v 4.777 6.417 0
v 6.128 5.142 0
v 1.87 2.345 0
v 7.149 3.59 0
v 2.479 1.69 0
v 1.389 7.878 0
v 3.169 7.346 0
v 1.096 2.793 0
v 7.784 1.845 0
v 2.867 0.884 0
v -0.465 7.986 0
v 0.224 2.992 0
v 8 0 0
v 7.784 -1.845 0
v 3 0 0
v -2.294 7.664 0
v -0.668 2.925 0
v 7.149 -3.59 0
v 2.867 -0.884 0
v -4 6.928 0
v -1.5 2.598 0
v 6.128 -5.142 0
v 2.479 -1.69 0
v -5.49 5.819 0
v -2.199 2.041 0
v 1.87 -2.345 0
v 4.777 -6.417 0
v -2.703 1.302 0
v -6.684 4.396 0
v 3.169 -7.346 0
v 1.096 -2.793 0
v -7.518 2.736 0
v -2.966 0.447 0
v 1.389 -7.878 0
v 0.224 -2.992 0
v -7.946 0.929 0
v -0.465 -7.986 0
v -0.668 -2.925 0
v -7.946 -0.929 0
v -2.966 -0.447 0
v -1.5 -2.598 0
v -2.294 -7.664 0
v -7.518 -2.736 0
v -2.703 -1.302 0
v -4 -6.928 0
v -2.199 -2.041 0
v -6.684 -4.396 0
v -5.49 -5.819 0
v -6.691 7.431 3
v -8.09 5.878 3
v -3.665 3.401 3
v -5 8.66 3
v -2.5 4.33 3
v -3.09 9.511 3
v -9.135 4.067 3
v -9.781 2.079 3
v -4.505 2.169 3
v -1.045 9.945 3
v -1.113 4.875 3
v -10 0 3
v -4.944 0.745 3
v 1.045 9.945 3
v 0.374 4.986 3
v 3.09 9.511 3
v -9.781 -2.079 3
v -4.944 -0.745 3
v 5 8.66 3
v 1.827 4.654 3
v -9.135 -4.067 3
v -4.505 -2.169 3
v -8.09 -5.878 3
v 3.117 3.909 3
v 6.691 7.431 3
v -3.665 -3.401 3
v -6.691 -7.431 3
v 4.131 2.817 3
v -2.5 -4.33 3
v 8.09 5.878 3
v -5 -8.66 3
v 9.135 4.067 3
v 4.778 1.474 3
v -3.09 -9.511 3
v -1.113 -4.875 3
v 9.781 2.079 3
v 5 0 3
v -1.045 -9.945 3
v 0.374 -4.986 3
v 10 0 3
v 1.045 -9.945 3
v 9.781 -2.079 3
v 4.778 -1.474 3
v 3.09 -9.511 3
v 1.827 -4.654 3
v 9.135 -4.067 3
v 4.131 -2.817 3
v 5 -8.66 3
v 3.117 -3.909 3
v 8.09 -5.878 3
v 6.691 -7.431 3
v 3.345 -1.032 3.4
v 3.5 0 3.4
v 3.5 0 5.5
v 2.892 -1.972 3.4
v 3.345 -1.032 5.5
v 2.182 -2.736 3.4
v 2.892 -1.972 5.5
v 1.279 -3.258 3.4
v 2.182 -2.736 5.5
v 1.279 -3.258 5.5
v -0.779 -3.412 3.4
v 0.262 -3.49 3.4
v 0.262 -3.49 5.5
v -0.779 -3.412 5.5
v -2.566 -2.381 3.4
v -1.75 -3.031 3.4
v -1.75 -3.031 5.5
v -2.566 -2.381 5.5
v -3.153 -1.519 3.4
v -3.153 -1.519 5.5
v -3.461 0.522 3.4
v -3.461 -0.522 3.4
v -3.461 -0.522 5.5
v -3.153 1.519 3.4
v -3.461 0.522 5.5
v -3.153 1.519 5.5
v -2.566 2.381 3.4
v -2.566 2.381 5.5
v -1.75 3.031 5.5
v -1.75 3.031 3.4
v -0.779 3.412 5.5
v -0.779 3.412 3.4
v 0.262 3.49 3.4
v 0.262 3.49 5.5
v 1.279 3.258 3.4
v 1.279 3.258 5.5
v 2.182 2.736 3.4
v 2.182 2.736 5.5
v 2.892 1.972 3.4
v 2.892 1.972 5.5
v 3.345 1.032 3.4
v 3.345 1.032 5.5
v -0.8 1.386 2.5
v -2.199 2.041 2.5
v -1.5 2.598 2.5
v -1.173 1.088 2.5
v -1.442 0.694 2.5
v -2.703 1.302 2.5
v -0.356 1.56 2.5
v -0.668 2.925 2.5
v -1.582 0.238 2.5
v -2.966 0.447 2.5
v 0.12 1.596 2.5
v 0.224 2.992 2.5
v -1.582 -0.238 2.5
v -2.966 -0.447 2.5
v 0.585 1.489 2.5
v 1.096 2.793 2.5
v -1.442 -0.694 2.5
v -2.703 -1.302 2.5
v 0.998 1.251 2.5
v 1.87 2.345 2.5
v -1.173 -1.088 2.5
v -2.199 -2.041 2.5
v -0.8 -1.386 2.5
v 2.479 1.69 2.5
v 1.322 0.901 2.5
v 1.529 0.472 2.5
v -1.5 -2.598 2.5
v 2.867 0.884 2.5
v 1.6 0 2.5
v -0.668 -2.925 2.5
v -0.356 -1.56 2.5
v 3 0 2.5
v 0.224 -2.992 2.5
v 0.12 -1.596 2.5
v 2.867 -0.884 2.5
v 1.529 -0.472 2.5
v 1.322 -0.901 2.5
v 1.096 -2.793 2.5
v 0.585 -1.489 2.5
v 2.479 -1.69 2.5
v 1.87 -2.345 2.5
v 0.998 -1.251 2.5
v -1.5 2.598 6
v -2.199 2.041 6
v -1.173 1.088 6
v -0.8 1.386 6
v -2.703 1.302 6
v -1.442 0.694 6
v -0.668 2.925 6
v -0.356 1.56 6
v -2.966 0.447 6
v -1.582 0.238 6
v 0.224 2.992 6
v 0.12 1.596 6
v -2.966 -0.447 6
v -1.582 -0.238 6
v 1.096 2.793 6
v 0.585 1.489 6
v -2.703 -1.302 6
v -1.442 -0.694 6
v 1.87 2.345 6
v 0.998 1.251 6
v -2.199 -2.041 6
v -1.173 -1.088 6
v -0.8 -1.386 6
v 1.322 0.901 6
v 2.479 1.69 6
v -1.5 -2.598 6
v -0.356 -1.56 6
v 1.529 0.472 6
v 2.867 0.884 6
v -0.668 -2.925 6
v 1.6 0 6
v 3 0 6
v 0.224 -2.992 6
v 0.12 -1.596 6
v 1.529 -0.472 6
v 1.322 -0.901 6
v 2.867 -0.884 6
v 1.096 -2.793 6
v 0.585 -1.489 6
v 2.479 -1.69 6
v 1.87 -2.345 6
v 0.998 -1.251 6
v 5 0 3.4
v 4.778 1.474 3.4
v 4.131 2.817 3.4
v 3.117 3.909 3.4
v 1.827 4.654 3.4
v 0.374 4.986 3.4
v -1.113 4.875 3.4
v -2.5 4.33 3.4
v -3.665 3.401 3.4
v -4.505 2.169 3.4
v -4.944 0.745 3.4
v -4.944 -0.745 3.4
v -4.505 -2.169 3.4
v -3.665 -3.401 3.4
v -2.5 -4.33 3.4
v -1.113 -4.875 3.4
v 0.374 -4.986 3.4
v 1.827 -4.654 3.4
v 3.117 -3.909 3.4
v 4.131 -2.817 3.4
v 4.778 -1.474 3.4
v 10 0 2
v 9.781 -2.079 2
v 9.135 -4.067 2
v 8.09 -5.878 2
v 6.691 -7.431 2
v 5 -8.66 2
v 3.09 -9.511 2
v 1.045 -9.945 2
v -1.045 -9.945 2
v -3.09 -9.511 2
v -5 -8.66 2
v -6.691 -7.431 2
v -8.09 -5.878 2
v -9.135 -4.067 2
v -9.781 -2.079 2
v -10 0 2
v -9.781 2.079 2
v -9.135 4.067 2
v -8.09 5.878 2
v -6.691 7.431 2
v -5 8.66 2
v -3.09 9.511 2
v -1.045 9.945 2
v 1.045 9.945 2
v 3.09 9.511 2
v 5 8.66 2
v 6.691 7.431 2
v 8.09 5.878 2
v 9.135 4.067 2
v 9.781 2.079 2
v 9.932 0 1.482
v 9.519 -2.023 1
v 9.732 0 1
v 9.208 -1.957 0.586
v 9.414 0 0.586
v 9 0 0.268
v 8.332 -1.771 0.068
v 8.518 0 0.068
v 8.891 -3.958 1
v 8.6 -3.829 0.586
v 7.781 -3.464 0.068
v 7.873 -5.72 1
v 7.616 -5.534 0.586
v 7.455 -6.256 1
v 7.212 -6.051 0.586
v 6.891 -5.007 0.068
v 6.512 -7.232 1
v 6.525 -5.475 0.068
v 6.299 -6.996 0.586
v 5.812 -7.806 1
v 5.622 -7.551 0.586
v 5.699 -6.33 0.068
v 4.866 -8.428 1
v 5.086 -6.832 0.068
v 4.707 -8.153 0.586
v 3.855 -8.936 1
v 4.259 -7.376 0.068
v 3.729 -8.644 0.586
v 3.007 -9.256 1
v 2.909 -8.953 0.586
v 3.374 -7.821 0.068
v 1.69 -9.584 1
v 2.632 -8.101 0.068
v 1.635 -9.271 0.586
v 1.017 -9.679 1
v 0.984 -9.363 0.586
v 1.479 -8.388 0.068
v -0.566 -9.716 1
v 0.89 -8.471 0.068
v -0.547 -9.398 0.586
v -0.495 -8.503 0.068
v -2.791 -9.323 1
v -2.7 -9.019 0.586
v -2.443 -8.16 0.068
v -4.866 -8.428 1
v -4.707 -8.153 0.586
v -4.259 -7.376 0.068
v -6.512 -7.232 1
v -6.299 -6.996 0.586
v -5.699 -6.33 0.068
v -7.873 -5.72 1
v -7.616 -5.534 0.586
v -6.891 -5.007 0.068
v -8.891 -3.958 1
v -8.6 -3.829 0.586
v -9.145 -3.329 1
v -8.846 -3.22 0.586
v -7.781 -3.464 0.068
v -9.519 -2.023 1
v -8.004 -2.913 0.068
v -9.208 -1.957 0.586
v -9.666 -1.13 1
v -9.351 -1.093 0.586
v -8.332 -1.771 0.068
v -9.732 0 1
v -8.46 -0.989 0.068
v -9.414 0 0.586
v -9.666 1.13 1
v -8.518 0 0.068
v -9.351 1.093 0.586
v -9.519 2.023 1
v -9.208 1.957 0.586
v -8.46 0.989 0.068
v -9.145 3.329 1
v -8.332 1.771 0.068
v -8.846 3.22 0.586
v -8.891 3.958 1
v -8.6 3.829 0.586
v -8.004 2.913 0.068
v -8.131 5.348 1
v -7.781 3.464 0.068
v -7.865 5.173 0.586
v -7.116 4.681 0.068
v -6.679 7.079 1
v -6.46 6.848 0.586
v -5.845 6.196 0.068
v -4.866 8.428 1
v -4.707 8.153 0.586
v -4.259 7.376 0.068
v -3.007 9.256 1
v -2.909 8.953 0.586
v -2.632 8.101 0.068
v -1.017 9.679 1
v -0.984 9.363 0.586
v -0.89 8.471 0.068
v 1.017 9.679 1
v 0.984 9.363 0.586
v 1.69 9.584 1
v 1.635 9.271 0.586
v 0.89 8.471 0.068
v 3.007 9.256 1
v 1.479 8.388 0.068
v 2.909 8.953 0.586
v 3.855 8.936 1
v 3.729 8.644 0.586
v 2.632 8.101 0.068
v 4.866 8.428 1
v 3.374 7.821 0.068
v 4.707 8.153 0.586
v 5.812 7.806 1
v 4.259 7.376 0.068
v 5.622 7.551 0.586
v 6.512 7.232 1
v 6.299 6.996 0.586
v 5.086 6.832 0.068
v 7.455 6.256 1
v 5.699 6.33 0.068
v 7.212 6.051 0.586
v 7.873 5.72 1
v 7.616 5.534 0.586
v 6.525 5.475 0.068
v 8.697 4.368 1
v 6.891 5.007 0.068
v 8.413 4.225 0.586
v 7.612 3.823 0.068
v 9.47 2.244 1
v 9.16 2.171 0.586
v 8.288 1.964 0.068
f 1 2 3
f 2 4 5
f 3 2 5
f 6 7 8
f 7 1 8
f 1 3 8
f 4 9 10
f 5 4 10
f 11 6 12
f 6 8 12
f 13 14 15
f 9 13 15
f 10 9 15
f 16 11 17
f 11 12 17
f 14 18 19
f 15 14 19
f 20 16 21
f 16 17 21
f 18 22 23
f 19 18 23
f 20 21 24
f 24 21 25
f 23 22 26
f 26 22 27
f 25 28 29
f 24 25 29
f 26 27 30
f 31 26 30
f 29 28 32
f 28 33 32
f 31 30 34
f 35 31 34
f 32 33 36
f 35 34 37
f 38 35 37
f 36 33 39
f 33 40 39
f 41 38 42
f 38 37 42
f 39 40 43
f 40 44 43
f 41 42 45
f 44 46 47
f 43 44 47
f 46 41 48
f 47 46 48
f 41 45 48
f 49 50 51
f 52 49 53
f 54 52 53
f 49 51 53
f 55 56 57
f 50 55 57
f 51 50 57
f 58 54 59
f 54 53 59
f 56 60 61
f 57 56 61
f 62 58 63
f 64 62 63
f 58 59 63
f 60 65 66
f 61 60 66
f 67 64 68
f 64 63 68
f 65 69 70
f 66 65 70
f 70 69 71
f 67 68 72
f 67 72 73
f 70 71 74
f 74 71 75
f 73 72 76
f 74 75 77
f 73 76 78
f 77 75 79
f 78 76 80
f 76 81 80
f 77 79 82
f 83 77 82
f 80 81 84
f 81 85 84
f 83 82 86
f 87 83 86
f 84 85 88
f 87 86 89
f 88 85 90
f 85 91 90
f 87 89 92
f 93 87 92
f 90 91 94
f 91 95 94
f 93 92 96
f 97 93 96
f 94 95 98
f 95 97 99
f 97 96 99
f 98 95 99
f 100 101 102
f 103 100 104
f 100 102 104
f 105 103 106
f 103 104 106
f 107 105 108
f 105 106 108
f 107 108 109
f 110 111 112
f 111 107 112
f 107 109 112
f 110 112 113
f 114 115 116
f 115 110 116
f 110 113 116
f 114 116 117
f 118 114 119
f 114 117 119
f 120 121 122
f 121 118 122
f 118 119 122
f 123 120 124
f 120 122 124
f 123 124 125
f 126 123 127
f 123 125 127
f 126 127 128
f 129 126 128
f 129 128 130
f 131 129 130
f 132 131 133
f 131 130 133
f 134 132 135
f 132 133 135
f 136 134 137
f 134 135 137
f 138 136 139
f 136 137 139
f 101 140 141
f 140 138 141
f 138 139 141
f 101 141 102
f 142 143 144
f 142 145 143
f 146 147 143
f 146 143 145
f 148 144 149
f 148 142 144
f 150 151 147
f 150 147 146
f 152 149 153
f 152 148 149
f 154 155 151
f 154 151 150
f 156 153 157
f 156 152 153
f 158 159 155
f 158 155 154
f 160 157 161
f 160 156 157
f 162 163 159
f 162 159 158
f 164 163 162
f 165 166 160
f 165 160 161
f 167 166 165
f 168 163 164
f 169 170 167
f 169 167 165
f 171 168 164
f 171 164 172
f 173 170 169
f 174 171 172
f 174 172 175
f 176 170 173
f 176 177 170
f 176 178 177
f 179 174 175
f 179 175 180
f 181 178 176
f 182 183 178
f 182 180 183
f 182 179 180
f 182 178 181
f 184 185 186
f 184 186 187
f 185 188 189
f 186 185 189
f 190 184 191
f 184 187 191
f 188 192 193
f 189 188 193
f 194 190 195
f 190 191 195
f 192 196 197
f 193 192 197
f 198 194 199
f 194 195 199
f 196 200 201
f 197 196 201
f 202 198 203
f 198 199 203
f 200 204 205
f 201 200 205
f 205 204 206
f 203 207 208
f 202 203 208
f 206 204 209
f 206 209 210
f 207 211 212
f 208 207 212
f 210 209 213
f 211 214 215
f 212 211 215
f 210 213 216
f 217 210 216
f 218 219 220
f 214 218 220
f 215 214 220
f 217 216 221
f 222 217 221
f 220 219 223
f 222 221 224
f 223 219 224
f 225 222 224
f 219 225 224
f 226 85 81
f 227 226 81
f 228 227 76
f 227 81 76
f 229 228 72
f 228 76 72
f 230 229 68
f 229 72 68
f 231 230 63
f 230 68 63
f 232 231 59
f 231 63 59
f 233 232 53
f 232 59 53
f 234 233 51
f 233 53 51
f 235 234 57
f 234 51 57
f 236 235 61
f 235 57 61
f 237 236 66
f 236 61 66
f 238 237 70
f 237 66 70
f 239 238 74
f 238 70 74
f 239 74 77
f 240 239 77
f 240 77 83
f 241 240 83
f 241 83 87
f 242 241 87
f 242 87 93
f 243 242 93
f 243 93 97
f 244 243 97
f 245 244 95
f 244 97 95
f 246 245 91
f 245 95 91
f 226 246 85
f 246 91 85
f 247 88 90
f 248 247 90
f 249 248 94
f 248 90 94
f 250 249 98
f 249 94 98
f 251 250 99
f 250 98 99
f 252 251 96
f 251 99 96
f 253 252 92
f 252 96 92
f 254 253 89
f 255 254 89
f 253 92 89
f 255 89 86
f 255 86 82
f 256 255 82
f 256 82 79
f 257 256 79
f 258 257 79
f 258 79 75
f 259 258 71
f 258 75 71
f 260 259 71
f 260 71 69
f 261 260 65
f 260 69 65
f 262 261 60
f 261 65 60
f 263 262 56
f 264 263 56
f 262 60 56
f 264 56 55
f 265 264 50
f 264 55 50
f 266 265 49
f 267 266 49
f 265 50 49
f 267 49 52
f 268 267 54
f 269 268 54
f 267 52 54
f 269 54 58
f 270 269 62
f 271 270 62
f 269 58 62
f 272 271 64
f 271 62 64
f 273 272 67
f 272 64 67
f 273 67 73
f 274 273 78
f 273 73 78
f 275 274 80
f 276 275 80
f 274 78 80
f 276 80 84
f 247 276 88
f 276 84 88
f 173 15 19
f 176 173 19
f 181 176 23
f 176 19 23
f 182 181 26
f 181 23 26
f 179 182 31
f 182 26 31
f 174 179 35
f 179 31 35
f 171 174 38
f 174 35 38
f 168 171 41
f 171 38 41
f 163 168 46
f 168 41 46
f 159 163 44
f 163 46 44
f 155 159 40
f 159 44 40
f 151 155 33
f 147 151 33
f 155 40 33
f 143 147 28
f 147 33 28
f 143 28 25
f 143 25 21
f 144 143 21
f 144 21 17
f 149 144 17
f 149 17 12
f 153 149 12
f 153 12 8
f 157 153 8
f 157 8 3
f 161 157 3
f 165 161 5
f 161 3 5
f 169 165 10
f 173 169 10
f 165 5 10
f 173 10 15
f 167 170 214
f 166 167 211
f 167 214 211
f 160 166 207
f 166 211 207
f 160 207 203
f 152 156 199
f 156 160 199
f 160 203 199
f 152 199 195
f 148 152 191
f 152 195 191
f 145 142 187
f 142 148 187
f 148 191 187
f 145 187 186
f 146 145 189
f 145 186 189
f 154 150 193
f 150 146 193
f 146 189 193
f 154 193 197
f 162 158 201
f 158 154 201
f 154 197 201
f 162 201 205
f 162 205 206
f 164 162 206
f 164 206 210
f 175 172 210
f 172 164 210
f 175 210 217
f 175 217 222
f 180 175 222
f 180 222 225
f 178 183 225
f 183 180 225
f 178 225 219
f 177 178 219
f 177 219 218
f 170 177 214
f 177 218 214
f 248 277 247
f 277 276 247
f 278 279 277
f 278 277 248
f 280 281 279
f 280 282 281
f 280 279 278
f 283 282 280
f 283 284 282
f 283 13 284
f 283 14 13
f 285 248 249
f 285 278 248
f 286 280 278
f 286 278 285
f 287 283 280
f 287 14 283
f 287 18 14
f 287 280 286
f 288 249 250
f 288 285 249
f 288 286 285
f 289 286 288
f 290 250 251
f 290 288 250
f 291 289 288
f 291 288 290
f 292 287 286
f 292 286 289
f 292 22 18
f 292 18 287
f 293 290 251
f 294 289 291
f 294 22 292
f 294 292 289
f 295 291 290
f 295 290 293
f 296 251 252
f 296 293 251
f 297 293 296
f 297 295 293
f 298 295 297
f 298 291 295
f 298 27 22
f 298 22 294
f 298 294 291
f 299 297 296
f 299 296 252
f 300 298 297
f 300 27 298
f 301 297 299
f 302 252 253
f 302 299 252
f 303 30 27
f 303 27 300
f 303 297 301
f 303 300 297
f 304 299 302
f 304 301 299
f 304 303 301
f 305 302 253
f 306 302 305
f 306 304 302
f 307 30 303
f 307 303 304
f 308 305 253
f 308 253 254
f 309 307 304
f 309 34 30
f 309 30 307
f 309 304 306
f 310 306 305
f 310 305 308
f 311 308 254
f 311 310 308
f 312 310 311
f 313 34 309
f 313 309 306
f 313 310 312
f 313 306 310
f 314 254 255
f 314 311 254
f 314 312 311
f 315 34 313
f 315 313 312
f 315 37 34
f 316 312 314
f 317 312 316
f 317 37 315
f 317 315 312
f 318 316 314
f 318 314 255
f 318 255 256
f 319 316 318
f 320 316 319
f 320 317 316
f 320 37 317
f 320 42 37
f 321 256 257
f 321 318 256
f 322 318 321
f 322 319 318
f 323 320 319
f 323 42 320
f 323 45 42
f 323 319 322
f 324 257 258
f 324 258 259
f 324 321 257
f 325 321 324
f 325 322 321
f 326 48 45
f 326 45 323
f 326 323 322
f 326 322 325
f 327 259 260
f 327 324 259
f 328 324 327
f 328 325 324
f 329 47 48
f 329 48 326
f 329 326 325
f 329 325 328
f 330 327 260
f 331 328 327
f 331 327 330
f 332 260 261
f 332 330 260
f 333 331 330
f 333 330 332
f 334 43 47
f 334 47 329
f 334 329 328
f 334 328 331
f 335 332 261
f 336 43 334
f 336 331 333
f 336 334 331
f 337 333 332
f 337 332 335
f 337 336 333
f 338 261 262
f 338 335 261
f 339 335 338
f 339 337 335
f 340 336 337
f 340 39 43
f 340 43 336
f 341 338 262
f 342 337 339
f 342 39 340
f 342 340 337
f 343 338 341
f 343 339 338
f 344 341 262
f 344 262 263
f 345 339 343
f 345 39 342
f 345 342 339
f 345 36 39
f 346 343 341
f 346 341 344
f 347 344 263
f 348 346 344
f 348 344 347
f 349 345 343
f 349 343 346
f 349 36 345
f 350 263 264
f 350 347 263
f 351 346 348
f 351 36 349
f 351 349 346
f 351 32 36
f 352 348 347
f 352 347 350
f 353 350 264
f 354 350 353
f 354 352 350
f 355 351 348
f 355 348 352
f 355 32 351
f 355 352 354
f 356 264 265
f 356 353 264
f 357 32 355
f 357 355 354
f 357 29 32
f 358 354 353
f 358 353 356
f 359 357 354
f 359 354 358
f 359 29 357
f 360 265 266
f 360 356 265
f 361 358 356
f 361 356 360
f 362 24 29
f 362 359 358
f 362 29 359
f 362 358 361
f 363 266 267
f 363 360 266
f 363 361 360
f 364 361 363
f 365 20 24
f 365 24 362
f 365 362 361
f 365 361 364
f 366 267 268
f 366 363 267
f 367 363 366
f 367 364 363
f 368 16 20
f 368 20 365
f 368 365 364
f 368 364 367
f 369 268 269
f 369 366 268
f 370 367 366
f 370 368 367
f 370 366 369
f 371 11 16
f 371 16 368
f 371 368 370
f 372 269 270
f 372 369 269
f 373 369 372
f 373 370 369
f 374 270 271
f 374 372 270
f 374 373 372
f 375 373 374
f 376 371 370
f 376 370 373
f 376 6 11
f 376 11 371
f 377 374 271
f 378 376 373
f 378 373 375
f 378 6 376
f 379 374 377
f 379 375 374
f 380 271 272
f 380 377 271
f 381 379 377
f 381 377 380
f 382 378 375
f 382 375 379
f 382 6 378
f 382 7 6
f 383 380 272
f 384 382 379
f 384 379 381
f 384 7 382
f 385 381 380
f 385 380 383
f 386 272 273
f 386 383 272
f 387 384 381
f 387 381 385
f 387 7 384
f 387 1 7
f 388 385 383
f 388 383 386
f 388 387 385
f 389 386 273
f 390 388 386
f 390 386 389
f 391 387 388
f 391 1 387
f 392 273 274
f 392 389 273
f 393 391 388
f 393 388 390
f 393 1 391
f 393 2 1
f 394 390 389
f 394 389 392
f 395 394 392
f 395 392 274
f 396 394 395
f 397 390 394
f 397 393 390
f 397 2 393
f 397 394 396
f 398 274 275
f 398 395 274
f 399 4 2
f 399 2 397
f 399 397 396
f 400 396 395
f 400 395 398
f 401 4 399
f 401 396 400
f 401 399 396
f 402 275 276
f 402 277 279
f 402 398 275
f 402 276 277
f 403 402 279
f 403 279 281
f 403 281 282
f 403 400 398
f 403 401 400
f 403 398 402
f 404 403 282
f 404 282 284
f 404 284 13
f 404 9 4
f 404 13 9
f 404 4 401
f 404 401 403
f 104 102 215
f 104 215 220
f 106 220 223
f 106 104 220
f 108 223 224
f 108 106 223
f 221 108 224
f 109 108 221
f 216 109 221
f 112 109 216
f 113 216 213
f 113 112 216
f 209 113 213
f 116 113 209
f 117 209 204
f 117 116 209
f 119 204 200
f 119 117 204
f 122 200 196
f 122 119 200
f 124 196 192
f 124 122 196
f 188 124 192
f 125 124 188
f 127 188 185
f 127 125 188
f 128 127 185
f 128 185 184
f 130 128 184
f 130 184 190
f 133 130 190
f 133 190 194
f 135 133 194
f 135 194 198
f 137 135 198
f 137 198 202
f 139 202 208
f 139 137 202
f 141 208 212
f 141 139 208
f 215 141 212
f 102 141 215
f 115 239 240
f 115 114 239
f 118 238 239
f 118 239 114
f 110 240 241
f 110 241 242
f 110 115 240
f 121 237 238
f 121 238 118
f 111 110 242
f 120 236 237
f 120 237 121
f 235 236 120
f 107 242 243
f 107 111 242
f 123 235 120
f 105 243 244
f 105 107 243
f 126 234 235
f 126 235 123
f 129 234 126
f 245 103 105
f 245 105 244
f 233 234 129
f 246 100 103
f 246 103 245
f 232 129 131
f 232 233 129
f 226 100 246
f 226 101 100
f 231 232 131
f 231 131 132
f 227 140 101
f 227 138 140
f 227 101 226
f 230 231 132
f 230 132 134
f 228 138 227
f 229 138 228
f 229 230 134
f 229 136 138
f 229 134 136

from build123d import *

# Parameters (mm, degrees)
F2_SIZE  = 0.5
F3_R     = 5
F3_R_2   = 3.5
F4_DEPTH = 0.4
F5_R     = 2
F6_R     = 1.6
F7_DEPTH = 25
F8_R     = 3
F8_R_2   = 1.6
F9_DEPTH = 2.5


# Not quite as in the source:
# - a feature names something its author has since deleted; it is built from what else it names


with BuildPart() as f1:
    # F0 (on Front) → F1 (revolve)
    with BuildSketch(Plane.XZ):
        Polygon((3.5, 6), (0, 6), (0, 0), (10, 0), (10, 3), (3.5, 3), align=None)
    revolve(axis=Axis((0, 0, 3), (0, 0, -1)))

    # F2
    f2_edges = [f1.edges().sort_by_distance(p)[0] for p in [
        (-3.5, 0, 6),
    ]]
    chamfer(f2_edges, length=F2_SIZE)

    # F3 (on face) → F4 (join)
    with BuildSketch(Plane.XY.offset(3)):
        Circle(F3_R)
        Circle(F3_R_2, mode=Mode.SUBTRACT)
    extrude(amount=F4_DEPTH)

    # F5
    f5_edges = [f1.edges().sort_by_distance(p)[0] for p in [
        (-10, 0, 0),
    ]]
    fillet(f5_edges, radius=F5_R)

    # F6 (on face) → F7 (cut)
    with BuildSketch(Plane.XY.offset(6)):
        Circle(F6_R)
    extrude(amount=-F7_DEPTH, mode=Mode.SUBTRACT)

    # F8 (on face) → F9 (cut)
    with BuildSketch(Plane(origin=(0, 0, 0), x_dir=(1, 0, 0), z_dir=(0, 0, -1))):
        Circle(F8_R)
        Circle(F8_R_2, mode=Mode.SUBTRACT)
    extrude(amount=-F9_DEPTH, mode=Mode.SUBTRACT)


solid = f1.part
